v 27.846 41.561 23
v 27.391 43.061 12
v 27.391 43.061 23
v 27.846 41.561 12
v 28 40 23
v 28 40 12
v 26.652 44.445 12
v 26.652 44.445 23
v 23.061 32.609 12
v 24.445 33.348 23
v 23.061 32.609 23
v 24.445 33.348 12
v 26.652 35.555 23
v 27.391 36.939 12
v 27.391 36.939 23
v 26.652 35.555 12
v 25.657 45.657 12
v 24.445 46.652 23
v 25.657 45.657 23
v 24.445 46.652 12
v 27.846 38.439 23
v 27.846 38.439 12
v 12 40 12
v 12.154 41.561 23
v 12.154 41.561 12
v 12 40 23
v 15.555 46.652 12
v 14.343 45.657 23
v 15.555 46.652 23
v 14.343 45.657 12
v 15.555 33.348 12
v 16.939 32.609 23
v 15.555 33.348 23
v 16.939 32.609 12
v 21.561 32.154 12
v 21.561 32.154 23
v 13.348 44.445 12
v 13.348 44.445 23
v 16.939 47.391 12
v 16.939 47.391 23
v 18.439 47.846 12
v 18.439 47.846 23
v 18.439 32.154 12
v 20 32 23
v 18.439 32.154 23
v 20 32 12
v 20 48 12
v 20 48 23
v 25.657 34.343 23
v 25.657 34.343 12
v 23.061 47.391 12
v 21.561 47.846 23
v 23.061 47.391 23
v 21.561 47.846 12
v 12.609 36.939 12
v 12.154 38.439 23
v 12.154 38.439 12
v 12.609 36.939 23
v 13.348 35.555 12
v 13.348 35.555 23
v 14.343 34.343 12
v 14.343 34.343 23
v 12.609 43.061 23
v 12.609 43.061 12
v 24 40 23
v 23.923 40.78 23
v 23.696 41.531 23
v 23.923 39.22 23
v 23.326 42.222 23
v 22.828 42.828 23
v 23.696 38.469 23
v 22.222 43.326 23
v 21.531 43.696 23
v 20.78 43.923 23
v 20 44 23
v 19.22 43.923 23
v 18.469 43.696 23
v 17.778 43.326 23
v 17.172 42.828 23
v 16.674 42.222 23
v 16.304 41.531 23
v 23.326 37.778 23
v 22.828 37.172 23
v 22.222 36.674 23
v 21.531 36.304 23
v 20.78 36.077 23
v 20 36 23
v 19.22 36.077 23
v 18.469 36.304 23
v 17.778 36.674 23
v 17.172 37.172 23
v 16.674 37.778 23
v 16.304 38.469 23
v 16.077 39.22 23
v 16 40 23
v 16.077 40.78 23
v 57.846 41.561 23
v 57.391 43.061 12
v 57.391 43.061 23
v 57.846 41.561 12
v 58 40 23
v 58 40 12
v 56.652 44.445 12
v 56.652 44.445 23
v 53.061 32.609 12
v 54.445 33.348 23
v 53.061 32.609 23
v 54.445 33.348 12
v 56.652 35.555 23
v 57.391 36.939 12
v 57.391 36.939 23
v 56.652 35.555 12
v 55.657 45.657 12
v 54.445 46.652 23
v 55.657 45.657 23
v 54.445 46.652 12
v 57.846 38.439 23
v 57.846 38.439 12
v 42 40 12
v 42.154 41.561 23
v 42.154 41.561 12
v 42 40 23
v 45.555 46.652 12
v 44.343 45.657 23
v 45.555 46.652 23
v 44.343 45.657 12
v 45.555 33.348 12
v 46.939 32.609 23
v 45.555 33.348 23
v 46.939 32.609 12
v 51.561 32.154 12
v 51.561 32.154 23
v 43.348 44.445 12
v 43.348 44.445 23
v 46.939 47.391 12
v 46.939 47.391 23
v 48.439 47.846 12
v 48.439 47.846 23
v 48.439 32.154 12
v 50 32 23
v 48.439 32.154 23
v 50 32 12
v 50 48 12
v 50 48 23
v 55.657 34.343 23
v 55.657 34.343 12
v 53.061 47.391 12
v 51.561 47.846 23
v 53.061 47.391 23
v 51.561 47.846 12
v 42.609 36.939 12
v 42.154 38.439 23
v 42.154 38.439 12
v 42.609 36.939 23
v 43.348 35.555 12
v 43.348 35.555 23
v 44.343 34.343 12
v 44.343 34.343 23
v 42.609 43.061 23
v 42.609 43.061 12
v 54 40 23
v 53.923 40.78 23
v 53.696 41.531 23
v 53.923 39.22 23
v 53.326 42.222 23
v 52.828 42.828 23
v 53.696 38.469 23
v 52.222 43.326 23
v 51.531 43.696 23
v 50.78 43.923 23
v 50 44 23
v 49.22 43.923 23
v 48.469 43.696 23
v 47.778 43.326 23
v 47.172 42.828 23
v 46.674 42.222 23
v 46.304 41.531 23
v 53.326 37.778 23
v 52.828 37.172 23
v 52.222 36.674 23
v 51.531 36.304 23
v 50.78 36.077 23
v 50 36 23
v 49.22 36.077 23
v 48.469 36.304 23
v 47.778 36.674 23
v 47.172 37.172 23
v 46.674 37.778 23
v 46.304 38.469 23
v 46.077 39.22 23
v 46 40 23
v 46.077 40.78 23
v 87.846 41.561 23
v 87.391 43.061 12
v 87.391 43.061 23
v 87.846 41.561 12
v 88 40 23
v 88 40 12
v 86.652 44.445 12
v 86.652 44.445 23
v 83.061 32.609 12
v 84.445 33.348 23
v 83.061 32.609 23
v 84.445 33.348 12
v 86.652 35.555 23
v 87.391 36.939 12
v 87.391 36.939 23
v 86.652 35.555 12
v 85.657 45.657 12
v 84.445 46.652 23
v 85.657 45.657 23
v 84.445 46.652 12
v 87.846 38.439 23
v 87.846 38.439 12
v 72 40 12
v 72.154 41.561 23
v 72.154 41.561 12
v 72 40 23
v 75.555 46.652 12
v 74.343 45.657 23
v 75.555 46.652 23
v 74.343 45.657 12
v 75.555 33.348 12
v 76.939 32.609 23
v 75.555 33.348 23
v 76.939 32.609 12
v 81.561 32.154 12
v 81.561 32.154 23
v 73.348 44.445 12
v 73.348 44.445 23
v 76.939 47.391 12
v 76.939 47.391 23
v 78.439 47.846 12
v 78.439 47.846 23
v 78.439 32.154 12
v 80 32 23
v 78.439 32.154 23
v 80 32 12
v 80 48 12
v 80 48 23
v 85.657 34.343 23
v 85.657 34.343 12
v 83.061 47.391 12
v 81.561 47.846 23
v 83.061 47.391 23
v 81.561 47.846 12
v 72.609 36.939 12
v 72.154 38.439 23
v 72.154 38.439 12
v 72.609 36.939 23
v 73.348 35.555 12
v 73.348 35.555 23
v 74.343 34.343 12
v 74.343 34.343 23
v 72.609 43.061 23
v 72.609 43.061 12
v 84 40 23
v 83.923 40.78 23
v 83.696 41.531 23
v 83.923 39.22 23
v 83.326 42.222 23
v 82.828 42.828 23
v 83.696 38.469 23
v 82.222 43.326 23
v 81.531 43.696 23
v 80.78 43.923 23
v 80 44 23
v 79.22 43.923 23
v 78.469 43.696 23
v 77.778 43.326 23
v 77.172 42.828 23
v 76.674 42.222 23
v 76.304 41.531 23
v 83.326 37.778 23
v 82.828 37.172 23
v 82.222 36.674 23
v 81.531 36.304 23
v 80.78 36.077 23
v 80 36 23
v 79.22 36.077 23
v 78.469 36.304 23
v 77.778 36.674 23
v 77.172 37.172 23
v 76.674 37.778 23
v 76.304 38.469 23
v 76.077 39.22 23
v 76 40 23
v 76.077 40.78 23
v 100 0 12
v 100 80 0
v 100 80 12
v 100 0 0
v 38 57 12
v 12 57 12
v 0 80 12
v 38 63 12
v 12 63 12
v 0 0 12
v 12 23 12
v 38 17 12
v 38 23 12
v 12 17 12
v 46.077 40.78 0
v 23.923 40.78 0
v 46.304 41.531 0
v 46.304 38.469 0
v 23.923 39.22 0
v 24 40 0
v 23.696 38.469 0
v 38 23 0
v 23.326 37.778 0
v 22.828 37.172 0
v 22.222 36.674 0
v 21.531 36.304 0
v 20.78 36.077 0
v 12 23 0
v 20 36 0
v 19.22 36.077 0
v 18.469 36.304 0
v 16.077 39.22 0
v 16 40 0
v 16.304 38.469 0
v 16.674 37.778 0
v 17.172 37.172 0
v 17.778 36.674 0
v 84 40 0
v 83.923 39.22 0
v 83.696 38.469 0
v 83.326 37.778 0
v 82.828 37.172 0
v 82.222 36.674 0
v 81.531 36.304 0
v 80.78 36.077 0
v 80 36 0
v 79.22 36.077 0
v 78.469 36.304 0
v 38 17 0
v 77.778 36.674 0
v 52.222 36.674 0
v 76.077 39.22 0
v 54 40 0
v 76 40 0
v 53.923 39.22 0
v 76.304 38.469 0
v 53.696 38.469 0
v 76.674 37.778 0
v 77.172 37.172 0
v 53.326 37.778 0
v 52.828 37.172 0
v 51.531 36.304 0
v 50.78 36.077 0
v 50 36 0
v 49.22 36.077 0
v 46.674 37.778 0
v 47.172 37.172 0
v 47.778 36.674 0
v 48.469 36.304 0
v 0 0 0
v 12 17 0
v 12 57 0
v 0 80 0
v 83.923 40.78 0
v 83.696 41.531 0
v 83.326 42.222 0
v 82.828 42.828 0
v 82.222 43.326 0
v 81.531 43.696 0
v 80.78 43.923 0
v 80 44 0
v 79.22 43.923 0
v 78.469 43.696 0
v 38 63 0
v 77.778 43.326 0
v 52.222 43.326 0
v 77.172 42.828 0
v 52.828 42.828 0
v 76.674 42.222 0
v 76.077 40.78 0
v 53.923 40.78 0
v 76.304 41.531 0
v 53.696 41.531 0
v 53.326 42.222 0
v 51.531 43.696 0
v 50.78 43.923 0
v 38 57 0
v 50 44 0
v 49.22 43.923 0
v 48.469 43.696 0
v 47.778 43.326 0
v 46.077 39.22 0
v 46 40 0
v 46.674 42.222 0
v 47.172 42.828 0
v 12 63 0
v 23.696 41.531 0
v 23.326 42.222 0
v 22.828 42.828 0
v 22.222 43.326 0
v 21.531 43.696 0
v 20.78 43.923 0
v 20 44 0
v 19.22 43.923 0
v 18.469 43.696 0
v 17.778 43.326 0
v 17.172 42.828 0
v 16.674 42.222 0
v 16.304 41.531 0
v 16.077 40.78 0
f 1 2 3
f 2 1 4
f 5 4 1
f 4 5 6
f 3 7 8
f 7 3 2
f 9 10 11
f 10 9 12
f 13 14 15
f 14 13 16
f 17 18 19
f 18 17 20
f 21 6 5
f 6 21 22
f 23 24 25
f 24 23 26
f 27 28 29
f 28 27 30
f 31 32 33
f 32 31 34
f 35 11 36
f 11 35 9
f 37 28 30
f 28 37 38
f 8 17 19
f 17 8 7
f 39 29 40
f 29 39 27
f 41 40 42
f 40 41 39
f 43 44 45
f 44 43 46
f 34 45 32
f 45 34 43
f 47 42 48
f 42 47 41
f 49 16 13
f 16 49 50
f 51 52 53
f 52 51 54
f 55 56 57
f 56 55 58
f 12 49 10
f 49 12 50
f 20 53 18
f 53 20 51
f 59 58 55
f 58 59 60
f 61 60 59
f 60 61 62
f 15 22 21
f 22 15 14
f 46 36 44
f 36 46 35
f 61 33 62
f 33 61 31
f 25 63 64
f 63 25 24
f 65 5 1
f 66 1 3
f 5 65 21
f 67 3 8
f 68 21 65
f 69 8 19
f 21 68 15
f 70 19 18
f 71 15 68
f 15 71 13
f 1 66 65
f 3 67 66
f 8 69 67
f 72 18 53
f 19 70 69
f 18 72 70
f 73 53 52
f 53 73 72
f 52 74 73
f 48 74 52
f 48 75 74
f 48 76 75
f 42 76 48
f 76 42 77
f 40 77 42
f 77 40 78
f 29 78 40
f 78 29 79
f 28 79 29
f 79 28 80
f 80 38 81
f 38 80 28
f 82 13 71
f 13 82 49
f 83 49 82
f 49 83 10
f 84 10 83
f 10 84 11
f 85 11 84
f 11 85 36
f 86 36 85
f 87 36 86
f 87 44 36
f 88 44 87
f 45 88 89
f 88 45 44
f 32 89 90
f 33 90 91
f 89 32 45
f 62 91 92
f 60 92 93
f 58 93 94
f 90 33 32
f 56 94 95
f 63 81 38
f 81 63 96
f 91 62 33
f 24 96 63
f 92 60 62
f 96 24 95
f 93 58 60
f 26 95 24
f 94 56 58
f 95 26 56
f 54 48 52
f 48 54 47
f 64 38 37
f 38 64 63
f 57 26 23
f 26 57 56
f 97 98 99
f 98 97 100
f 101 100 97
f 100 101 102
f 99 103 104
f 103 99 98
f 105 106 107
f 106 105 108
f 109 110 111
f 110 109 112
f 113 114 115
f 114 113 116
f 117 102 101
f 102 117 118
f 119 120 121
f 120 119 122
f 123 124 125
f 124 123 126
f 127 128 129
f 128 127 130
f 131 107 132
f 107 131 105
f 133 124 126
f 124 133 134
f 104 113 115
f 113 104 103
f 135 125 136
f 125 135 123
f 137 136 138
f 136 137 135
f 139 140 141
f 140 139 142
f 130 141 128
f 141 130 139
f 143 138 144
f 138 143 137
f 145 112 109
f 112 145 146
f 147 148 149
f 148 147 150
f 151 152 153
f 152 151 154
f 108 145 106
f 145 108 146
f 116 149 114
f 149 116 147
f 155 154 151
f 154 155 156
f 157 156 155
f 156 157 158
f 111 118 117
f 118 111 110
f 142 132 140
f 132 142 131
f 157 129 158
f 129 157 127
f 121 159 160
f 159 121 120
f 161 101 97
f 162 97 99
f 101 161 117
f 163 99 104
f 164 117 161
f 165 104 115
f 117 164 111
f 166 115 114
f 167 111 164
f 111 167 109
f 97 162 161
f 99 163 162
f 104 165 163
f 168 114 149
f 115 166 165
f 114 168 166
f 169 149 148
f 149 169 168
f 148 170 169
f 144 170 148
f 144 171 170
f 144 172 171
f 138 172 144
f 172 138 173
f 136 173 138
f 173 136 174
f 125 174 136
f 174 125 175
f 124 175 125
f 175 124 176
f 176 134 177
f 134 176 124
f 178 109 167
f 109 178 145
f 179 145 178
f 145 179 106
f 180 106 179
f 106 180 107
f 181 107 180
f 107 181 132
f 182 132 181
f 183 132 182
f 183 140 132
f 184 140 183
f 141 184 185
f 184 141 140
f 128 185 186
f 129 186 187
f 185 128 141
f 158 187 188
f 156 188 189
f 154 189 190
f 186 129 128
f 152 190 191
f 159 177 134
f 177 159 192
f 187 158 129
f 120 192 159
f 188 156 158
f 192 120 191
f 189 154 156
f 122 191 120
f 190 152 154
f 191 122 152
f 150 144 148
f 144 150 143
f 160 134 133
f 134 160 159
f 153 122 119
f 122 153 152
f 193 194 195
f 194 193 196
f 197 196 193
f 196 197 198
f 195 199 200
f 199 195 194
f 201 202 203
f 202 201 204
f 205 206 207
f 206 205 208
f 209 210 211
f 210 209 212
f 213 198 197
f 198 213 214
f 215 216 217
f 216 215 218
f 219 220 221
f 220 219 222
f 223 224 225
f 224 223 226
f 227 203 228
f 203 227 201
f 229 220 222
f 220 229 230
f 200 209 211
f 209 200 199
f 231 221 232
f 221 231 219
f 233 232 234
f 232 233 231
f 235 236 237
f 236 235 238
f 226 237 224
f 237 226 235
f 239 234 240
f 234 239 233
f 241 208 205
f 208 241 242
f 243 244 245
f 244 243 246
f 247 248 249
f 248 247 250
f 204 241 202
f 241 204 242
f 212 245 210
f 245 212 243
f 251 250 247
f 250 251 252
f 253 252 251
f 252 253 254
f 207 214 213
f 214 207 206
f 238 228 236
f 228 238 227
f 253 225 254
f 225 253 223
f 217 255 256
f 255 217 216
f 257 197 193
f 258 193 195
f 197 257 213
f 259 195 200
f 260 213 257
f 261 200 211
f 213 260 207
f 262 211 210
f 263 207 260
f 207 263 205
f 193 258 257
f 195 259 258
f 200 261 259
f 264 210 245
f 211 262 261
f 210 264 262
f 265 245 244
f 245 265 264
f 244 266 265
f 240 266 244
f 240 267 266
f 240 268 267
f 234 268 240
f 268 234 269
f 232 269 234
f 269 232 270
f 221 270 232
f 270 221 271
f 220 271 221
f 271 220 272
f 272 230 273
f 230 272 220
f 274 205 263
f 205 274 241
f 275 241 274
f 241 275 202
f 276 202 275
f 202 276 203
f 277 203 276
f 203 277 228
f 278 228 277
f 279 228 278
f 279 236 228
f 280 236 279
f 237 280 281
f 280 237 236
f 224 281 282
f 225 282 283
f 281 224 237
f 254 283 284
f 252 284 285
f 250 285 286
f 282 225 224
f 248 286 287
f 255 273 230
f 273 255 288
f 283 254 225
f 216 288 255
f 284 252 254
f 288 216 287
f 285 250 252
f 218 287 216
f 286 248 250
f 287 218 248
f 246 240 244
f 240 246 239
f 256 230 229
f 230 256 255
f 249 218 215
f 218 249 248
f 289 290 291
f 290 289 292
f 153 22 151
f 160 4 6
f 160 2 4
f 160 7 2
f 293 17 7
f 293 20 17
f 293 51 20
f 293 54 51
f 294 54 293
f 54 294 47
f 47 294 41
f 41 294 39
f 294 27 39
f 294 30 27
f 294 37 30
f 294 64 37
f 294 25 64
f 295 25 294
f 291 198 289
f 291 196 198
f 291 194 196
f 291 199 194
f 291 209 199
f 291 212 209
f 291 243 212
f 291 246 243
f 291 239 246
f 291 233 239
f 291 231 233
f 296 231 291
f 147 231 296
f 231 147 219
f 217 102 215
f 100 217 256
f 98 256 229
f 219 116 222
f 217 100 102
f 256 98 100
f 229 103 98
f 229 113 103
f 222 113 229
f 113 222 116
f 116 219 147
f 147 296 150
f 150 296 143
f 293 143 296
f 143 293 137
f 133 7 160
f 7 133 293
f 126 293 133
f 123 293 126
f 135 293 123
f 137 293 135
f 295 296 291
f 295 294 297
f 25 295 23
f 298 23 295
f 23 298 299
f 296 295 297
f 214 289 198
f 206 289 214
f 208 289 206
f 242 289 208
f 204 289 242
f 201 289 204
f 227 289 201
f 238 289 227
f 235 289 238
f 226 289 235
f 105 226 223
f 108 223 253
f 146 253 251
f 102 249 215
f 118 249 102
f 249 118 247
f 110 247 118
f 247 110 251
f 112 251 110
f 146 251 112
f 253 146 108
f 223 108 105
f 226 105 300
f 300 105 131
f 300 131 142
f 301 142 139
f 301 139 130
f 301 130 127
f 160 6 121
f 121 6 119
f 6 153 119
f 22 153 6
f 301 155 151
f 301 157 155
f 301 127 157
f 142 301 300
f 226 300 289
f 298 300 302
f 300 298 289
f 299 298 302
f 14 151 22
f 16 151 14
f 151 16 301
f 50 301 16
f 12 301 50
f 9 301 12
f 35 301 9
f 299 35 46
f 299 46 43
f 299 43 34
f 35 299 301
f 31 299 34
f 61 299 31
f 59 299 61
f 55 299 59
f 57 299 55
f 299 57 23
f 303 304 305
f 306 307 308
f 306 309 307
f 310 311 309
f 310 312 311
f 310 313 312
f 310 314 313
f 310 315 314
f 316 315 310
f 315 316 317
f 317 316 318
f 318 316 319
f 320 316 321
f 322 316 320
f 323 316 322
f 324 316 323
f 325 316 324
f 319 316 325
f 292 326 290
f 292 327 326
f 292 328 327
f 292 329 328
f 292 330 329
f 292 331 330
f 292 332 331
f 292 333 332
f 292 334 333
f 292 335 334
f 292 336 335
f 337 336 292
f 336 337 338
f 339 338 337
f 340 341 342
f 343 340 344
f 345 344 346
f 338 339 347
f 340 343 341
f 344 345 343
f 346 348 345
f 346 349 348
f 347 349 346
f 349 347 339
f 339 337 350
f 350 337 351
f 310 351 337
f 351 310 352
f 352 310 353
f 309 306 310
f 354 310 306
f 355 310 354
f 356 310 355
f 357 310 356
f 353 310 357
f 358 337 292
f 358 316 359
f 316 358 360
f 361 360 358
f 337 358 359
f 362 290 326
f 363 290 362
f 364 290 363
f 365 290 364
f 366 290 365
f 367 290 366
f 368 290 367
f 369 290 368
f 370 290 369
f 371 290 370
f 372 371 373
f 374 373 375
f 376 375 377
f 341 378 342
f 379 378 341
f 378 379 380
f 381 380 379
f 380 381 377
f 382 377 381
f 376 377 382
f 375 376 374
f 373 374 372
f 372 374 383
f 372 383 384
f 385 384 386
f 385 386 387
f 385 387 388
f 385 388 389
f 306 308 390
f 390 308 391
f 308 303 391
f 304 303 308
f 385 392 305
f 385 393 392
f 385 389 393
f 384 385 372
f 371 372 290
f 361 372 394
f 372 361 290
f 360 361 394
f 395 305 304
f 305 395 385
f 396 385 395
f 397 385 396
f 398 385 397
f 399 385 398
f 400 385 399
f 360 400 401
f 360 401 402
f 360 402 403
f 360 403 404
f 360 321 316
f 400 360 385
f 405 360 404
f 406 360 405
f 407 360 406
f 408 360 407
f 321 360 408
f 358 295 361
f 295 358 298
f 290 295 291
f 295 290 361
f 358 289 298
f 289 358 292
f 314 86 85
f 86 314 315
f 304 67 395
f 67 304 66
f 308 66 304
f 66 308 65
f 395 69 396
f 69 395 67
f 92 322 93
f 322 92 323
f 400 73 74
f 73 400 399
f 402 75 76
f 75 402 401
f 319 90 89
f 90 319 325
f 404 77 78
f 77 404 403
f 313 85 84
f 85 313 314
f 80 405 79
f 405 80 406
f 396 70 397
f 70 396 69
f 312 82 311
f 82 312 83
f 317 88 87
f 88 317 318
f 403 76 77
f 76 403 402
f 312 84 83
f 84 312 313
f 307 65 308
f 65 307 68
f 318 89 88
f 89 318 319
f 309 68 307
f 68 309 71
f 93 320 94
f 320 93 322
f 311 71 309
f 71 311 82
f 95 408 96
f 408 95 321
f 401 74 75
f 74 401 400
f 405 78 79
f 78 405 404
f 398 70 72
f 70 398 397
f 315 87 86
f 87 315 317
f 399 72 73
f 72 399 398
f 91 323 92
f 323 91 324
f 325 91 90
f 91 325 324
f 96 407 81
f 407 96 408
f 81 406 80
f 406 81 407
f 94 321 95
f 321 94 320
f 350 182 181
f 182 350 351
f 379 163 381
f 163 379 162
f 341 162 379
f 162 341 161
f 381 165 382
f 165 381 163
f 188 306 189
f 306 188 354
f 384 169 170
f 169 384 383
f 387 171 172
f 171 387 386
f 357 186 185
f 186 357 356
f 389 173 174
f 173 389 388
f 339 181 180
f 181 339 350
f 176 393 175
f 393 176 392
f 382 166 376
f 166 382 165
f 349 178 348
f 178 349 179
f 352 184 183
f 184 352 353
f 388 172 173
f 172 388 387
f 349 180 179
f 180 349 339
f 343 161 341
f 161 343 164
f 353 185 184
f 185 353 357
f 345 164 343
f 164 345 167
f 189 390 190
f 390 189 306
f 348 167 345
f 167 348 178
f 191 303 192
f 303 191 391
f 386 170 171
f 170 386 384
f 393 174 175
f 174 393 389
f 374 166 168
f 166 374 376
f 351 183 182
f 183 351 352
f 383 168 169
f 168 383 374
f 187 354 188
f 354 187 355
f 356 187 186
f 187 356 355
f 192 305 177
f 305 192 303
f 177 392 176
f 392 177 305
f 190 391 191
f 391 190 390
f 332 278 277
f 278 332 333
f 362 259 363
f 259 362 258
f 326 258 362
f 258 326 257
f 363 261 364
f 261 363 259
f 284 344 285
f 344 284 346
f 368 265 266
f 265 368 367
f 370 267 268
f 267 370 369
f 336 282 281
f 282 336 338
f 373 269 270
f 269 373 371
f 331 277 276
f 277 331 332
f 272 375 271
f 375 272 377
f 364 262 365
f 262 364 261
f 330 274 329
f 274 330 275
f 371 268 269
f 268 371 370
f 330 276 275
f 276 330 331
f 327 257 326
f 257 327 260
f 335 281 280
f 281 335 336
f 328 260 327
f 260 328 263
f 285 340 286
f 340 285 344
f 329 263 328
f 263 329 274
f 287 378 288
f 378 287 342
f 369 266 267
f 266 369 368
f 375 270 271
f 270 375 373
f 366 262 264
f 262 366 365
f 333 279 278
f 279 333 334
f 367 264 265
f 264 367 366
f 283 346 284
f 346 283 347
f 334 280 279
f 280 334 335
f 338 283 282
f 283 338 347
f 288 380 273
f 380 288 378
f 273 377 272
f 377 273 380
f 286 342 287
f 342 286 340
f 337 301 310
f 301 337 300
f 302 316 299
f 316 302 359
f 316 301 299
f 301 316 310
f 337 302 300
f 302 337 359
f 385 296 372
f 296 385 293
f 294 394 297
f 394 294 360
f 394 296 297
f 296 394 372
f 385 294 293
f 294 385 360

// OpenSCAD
$fn = 32;

// ----------------------------------------------------------------------
// Drill jig: three_boss_slot jig
// ----------------------------------------------------------------------

// --- parameters (mm) ---
plate_l = 100;            // plate length, X
plate_w = 80;             // plate width, Y
plate_t = 12;             // plate thickness
boss_d = 16;              // guide boss diameter
boss_h = 12;              // boss height above the plate
guide_d = 8;              // guide hole diameter
boss_pitch = 30;          // boss pitch
slot_w = 6;               // clamp slot width
slot_l = 26;              // clamp slot length
slot_x = 12;              // slot start X

n_boss = 3;  // guide bosses
boss_x0 = (plate_l - (n_boss - 1) * boss_pitch) / 2;  // first boss X
boss_top = plate_t - 1 + boss_h;  // boss crown height
total_h = boss_top;  // overall height

difference() {
  union() {
  cube([plate_l, plate_w, plate_t]);
  for (i = [0 : n_boss - 1])
    translate([boss_x0 + i * boss_pitch, plate_w / 2, plate_t - 1])
      cylinder(h = boss_h, d = boss_d);
  }
  for (i = [0 : n_boss - 1])
    translate([boss_x0 + i * boss_pitch, plate_w / 2, -1])
      cylinder(h = plate_t + boss_h, d = guide_d);
  for (cy = [plate_w * 0.25, plate_w * 0.75])
    translate([slot_x, cy - slot_w / 2, -1])
      cube([slot_l, slot_w, plate_t + 2]);
}
